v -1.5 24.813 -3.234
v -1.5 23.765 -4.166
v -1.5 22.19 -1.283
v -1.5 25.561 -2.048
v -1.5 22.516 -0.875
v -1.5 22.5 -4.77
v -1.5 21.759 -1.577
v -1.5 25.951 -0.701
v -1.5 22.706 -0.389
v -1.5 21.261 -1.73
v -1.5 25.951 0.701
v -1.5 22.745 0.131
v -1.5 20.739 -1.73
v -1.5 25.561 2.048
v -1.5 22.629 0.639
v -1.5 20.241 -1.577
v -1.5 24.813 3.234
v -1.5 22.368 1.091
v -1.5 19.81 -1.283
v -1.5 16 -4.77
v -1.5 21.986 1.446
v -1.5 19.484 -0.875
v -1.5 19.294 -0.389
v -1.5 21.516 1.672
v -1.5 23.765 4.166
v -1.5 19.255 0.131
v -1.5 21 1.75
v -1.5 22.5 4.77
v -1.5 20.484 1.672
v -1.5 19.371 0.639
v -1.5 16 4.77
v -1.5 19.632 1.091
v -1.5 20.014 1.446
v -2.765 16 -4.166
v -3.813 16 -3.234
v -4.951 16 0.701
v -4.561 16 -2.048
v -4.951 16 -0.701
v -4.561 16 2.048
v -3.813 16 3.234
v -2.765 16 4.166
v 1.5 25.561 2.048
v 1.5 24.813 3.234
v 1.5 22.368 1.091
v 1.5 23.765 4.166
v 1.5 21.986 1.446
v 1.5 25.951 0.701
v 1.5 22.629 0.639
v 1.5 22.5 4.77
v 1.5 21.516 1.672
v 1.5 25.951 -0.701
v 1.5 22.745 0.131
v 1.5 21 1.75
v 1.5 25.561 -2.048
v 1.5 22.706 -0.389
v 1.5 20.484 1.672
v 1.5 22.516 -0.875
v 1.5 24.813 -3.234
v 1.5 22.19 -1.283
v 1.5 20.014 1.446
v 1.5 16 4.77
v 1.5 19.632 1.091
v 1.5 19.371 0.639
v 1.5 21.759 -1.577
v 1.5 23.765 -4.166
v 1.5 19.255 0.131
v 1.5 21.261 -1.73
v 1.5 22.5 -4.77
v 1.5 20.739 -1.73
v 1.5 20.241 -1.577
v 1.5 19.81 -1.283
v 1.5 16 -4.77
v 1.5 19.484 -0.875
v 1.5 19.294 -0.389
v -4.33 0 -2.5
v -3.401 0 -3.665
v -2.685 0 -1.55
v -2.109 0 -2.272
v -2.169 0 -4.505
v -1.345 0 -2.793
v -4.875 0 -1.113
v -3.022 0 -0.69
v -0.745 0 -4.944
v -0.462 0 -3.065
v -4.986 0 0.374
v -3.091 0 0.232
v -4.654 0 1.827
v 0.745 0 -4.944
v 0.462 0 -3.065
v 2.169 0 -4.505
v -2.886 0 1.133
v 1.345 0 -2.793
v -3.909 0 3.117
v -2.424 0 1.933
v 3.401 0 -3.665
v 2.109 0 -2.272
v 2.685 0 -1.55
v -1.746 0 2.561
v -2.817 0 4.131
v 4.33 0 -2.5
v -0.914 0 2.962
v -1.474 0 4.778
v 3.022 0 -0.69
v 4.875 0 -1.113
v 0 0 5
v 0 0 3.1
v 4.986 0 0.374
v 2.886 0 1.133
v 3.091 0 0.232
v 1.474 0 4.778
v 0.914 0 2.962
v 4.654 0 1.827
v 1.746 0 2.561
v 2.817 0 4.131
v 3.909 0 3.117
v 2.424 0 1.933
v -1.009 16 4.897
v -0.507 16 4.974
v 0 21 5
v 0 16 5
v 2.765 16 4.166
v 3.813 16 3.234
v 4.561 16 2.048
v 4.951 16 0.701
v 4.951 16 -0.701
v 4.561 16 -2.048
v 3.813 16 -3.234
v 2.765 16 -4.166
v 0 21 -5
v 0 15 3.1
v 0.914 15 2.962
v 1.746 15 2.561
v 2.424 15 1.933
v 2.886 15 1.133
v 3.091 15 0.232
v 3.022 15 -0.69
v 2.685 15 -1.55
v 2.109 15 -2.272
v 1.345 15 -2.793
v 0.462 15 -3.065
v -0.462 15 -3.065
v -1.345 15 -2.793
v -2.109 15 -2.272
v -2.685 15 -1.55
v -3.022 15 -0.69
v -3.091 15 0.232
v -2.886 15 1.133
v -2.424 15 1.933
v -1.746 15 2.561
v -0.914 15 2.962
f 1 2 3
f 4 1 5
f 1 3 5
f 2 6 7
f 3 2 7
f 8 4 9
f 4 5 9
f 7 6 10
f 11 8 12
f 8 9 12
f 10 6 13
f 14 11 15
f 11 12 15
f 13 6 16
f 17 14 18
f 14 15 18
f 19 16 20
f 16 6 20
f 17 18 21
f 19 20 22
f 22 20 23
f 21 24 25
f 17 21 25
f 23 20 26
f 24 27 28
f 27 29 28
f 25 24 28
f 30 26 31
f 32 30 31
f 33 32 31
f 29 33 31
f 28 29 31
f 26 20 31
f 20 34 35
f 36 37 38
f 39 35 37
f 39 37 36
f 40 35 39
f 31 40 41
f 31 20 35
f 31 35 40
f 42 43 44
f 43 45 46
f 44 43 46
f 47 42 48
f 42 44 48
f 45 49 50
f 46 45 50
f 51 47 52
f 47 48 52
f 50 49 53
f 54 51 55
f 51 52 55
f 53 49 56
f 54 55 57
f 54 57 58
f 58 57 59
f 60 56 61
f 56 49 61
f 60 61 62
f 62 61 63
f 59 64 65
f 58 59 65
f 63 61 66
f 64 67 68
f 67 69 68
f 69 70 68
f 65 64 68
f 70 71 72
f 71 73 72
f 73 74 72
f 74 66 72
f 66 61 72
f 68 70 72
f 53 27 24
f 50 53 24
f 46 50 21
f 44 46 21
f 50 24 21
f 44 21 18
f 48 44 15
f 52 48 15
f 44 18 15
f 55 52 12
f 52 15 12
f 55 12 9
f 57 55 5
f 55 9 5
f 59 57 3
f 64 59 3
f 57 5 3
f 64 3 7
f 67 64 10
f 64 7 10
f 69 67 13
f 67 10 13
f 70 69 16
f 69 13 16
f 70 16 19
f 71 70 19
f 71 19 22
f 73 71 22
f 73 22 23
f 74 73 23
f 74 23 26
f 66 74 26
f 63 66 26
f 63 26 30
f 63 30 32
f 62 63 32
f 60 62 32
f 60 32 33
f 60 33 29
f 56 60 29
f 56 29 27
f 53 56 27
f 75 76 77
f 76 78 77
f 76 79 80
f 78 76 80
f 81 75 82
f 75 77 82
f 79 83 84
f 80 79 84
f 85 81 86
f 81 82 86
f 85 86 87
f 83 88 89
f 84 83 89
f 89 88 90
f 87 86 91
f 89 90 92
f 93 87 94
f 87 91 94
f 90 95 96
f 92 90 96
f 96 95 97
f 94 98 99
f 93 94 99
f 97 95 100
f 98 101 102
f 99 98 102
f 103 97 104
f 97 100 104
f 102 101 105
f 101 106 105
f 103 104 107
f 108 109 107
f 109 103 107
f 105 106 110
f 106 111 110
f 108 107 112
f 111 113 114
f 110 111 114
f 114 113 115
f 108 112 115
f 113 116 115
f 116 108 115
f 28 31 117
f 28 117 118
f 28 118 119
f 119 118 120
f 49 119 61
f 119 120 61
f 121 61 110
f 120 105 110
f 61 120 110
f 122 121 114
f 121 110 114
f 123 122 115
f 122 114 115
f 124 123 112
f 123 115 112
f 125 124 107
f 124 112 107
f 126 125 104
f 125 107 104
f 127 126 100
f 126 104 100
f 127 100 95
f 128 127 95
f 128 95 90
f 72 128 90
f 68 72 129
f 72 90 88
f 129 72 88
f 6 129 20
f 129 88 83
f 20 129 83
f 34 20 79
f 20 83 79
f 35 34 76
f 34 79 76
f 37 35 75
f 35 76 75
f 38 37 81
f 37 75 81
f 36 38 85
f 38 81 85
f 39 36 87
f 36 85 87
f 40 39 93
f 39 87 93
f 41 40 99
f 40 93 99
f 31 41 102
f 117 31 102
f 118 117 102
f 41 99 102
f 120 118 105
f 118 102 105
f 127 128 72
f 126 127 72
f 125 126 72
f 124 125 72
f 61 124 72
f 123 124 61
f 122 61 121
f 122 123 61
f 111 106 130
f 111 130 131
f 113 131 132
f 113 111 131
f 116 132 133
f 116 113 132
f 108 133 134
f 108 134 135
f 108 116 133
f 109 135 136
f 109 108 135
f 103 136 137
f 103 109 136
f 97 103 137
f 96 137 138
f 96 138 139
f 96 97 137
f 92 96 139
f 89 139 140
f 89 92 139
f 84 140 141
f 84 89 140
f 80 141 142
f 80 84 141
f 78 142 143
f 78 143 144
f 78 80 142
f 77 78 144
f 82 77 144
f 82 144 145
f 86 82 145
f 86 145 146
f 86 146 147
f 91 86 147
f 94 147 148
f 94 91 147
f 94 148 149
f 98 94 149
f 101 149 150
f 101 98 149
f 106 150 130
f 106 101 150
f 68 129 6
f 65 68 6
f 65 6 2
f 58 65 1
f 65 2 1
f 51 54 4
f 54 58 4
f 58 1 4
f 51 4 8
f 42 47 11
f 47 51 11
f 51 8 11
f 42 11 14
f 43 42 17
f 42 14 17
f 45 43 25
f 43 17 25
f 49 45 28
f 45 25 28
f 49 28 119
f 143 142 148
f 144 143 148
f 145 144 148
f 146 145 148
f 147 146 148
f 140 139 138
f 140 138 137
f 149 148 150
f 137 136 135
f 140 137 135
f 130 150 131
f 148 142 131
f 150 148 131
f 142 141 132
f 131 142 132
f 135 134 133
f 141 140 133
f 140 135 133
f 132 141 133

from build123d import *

# Parameters (mm, degrees)
SKETCH1_R               = 5
SKETCH1_R_2             = 3.1
BOSS_EXTRUDE1_DEPTH     = 15
SKETCH2_R               = 5
BOSS_EXTRUDE2_DEPTH     = 1
BOSS_EXTRUDE3_DEPTH     = 10
SKETCH5_R               = 1.75
CUT_EXTRUDE1_DEPTH      = 28.26261176
CUT_EXTRUDE2_DEPTH      = 27.944387171
CUT_EXTRUDE2_DEPTH_BACK = 27.944387171


with BuildPart() as part:
    # Sketch1 → Boss-Extrude1 (new body)
    with BuildSketch(Plane(origin=(0, 0, 0), x_dir=(1, 0, 0), z_dir=(0, 1, 0))):
        with Locations(Location((0, 0, 0), (0, 0, 270))):
            Circle(SKETCH1_R)
        with Locations(Location((0, 0, 0), (0, 0, 270))):
            Circle(SKETCH1_R_2, mode=Mode.SUBTRACT)
    extrude(amount=BOSS_EXTRUDE1_DEPTH)

    # Sketch2 → Boss-Extrude2 (add)
    with BuildSketch(Plane(origin=(0, 15, 0), x_dir=(1, 0, 0), z_dir=(0, 1, 0))):
        with Locations(Location((0, 0, 0), (0, 0, 270))):
            Circle(SKETCH2_R)
    extrude(amount=BOSS_EXTRUDE2_DEPTH)

    # Sketch4 → Boss-Extrude3 (add)
    with BuildSketch(Plane(origin=(0, 16, 0), x_dir=(1, 0, 0), z_dir=(0, 1, 0))):
        with BuildLine():
            Line((-1.5, 4.769696007), (-1.5, -4.769696007))
            ThreePointArc((-1.5, -4.769696007), (0, -5), (1.5, -4.769696007))
            Line((1.5, -4.769696007), (1.5, 4.769696007))
            ThreePointArc((1.5, 4.769696007), (0, 5), (-1.5, 4.769696007))
        make_face()
    extrude(amount=BOSS_EXTRUDE3_DEPTH)

    # Sketch5 → Cut-Extrude1 (cut, through all)
    with BuildSketch(Plane.ZY.offset(1.5)):
        with Locations((0, 21)):
            Circle(SKETCH5_R)
    extrude(amount=-CUT_EXTRUDE1_DEPTH, mode=Mode.SUBTRACT)

    # Sketch6 → Cut-Extrude2 (cut, two sides: drawn at the far end of the back side and taken through both)
    with BuildSketch(Plane(origin=(0, 0, 0), x_dir=(0, 0, -1), z_dir=(1, 0, 0)).offset(-CUT_EXTRUDE2_DEPTH_BACK)):
        with BuildLine():
            Line((-5, 21), (-5, 26.951981281))
            Line((-5, 26.951981281), (5, 26.951981281))
            Line((5, 26.951981281), (5, 21))
            ThreePointArc((5, 21), (0, 26), (-5, 21))
        make_face()
    extrude(amount=CUT_EXTRUDE2_DEPTH + CUT_EXTRUDE2_DEPTH_BACK, mode=Mode.SUBTRACT)


solid = part.part
